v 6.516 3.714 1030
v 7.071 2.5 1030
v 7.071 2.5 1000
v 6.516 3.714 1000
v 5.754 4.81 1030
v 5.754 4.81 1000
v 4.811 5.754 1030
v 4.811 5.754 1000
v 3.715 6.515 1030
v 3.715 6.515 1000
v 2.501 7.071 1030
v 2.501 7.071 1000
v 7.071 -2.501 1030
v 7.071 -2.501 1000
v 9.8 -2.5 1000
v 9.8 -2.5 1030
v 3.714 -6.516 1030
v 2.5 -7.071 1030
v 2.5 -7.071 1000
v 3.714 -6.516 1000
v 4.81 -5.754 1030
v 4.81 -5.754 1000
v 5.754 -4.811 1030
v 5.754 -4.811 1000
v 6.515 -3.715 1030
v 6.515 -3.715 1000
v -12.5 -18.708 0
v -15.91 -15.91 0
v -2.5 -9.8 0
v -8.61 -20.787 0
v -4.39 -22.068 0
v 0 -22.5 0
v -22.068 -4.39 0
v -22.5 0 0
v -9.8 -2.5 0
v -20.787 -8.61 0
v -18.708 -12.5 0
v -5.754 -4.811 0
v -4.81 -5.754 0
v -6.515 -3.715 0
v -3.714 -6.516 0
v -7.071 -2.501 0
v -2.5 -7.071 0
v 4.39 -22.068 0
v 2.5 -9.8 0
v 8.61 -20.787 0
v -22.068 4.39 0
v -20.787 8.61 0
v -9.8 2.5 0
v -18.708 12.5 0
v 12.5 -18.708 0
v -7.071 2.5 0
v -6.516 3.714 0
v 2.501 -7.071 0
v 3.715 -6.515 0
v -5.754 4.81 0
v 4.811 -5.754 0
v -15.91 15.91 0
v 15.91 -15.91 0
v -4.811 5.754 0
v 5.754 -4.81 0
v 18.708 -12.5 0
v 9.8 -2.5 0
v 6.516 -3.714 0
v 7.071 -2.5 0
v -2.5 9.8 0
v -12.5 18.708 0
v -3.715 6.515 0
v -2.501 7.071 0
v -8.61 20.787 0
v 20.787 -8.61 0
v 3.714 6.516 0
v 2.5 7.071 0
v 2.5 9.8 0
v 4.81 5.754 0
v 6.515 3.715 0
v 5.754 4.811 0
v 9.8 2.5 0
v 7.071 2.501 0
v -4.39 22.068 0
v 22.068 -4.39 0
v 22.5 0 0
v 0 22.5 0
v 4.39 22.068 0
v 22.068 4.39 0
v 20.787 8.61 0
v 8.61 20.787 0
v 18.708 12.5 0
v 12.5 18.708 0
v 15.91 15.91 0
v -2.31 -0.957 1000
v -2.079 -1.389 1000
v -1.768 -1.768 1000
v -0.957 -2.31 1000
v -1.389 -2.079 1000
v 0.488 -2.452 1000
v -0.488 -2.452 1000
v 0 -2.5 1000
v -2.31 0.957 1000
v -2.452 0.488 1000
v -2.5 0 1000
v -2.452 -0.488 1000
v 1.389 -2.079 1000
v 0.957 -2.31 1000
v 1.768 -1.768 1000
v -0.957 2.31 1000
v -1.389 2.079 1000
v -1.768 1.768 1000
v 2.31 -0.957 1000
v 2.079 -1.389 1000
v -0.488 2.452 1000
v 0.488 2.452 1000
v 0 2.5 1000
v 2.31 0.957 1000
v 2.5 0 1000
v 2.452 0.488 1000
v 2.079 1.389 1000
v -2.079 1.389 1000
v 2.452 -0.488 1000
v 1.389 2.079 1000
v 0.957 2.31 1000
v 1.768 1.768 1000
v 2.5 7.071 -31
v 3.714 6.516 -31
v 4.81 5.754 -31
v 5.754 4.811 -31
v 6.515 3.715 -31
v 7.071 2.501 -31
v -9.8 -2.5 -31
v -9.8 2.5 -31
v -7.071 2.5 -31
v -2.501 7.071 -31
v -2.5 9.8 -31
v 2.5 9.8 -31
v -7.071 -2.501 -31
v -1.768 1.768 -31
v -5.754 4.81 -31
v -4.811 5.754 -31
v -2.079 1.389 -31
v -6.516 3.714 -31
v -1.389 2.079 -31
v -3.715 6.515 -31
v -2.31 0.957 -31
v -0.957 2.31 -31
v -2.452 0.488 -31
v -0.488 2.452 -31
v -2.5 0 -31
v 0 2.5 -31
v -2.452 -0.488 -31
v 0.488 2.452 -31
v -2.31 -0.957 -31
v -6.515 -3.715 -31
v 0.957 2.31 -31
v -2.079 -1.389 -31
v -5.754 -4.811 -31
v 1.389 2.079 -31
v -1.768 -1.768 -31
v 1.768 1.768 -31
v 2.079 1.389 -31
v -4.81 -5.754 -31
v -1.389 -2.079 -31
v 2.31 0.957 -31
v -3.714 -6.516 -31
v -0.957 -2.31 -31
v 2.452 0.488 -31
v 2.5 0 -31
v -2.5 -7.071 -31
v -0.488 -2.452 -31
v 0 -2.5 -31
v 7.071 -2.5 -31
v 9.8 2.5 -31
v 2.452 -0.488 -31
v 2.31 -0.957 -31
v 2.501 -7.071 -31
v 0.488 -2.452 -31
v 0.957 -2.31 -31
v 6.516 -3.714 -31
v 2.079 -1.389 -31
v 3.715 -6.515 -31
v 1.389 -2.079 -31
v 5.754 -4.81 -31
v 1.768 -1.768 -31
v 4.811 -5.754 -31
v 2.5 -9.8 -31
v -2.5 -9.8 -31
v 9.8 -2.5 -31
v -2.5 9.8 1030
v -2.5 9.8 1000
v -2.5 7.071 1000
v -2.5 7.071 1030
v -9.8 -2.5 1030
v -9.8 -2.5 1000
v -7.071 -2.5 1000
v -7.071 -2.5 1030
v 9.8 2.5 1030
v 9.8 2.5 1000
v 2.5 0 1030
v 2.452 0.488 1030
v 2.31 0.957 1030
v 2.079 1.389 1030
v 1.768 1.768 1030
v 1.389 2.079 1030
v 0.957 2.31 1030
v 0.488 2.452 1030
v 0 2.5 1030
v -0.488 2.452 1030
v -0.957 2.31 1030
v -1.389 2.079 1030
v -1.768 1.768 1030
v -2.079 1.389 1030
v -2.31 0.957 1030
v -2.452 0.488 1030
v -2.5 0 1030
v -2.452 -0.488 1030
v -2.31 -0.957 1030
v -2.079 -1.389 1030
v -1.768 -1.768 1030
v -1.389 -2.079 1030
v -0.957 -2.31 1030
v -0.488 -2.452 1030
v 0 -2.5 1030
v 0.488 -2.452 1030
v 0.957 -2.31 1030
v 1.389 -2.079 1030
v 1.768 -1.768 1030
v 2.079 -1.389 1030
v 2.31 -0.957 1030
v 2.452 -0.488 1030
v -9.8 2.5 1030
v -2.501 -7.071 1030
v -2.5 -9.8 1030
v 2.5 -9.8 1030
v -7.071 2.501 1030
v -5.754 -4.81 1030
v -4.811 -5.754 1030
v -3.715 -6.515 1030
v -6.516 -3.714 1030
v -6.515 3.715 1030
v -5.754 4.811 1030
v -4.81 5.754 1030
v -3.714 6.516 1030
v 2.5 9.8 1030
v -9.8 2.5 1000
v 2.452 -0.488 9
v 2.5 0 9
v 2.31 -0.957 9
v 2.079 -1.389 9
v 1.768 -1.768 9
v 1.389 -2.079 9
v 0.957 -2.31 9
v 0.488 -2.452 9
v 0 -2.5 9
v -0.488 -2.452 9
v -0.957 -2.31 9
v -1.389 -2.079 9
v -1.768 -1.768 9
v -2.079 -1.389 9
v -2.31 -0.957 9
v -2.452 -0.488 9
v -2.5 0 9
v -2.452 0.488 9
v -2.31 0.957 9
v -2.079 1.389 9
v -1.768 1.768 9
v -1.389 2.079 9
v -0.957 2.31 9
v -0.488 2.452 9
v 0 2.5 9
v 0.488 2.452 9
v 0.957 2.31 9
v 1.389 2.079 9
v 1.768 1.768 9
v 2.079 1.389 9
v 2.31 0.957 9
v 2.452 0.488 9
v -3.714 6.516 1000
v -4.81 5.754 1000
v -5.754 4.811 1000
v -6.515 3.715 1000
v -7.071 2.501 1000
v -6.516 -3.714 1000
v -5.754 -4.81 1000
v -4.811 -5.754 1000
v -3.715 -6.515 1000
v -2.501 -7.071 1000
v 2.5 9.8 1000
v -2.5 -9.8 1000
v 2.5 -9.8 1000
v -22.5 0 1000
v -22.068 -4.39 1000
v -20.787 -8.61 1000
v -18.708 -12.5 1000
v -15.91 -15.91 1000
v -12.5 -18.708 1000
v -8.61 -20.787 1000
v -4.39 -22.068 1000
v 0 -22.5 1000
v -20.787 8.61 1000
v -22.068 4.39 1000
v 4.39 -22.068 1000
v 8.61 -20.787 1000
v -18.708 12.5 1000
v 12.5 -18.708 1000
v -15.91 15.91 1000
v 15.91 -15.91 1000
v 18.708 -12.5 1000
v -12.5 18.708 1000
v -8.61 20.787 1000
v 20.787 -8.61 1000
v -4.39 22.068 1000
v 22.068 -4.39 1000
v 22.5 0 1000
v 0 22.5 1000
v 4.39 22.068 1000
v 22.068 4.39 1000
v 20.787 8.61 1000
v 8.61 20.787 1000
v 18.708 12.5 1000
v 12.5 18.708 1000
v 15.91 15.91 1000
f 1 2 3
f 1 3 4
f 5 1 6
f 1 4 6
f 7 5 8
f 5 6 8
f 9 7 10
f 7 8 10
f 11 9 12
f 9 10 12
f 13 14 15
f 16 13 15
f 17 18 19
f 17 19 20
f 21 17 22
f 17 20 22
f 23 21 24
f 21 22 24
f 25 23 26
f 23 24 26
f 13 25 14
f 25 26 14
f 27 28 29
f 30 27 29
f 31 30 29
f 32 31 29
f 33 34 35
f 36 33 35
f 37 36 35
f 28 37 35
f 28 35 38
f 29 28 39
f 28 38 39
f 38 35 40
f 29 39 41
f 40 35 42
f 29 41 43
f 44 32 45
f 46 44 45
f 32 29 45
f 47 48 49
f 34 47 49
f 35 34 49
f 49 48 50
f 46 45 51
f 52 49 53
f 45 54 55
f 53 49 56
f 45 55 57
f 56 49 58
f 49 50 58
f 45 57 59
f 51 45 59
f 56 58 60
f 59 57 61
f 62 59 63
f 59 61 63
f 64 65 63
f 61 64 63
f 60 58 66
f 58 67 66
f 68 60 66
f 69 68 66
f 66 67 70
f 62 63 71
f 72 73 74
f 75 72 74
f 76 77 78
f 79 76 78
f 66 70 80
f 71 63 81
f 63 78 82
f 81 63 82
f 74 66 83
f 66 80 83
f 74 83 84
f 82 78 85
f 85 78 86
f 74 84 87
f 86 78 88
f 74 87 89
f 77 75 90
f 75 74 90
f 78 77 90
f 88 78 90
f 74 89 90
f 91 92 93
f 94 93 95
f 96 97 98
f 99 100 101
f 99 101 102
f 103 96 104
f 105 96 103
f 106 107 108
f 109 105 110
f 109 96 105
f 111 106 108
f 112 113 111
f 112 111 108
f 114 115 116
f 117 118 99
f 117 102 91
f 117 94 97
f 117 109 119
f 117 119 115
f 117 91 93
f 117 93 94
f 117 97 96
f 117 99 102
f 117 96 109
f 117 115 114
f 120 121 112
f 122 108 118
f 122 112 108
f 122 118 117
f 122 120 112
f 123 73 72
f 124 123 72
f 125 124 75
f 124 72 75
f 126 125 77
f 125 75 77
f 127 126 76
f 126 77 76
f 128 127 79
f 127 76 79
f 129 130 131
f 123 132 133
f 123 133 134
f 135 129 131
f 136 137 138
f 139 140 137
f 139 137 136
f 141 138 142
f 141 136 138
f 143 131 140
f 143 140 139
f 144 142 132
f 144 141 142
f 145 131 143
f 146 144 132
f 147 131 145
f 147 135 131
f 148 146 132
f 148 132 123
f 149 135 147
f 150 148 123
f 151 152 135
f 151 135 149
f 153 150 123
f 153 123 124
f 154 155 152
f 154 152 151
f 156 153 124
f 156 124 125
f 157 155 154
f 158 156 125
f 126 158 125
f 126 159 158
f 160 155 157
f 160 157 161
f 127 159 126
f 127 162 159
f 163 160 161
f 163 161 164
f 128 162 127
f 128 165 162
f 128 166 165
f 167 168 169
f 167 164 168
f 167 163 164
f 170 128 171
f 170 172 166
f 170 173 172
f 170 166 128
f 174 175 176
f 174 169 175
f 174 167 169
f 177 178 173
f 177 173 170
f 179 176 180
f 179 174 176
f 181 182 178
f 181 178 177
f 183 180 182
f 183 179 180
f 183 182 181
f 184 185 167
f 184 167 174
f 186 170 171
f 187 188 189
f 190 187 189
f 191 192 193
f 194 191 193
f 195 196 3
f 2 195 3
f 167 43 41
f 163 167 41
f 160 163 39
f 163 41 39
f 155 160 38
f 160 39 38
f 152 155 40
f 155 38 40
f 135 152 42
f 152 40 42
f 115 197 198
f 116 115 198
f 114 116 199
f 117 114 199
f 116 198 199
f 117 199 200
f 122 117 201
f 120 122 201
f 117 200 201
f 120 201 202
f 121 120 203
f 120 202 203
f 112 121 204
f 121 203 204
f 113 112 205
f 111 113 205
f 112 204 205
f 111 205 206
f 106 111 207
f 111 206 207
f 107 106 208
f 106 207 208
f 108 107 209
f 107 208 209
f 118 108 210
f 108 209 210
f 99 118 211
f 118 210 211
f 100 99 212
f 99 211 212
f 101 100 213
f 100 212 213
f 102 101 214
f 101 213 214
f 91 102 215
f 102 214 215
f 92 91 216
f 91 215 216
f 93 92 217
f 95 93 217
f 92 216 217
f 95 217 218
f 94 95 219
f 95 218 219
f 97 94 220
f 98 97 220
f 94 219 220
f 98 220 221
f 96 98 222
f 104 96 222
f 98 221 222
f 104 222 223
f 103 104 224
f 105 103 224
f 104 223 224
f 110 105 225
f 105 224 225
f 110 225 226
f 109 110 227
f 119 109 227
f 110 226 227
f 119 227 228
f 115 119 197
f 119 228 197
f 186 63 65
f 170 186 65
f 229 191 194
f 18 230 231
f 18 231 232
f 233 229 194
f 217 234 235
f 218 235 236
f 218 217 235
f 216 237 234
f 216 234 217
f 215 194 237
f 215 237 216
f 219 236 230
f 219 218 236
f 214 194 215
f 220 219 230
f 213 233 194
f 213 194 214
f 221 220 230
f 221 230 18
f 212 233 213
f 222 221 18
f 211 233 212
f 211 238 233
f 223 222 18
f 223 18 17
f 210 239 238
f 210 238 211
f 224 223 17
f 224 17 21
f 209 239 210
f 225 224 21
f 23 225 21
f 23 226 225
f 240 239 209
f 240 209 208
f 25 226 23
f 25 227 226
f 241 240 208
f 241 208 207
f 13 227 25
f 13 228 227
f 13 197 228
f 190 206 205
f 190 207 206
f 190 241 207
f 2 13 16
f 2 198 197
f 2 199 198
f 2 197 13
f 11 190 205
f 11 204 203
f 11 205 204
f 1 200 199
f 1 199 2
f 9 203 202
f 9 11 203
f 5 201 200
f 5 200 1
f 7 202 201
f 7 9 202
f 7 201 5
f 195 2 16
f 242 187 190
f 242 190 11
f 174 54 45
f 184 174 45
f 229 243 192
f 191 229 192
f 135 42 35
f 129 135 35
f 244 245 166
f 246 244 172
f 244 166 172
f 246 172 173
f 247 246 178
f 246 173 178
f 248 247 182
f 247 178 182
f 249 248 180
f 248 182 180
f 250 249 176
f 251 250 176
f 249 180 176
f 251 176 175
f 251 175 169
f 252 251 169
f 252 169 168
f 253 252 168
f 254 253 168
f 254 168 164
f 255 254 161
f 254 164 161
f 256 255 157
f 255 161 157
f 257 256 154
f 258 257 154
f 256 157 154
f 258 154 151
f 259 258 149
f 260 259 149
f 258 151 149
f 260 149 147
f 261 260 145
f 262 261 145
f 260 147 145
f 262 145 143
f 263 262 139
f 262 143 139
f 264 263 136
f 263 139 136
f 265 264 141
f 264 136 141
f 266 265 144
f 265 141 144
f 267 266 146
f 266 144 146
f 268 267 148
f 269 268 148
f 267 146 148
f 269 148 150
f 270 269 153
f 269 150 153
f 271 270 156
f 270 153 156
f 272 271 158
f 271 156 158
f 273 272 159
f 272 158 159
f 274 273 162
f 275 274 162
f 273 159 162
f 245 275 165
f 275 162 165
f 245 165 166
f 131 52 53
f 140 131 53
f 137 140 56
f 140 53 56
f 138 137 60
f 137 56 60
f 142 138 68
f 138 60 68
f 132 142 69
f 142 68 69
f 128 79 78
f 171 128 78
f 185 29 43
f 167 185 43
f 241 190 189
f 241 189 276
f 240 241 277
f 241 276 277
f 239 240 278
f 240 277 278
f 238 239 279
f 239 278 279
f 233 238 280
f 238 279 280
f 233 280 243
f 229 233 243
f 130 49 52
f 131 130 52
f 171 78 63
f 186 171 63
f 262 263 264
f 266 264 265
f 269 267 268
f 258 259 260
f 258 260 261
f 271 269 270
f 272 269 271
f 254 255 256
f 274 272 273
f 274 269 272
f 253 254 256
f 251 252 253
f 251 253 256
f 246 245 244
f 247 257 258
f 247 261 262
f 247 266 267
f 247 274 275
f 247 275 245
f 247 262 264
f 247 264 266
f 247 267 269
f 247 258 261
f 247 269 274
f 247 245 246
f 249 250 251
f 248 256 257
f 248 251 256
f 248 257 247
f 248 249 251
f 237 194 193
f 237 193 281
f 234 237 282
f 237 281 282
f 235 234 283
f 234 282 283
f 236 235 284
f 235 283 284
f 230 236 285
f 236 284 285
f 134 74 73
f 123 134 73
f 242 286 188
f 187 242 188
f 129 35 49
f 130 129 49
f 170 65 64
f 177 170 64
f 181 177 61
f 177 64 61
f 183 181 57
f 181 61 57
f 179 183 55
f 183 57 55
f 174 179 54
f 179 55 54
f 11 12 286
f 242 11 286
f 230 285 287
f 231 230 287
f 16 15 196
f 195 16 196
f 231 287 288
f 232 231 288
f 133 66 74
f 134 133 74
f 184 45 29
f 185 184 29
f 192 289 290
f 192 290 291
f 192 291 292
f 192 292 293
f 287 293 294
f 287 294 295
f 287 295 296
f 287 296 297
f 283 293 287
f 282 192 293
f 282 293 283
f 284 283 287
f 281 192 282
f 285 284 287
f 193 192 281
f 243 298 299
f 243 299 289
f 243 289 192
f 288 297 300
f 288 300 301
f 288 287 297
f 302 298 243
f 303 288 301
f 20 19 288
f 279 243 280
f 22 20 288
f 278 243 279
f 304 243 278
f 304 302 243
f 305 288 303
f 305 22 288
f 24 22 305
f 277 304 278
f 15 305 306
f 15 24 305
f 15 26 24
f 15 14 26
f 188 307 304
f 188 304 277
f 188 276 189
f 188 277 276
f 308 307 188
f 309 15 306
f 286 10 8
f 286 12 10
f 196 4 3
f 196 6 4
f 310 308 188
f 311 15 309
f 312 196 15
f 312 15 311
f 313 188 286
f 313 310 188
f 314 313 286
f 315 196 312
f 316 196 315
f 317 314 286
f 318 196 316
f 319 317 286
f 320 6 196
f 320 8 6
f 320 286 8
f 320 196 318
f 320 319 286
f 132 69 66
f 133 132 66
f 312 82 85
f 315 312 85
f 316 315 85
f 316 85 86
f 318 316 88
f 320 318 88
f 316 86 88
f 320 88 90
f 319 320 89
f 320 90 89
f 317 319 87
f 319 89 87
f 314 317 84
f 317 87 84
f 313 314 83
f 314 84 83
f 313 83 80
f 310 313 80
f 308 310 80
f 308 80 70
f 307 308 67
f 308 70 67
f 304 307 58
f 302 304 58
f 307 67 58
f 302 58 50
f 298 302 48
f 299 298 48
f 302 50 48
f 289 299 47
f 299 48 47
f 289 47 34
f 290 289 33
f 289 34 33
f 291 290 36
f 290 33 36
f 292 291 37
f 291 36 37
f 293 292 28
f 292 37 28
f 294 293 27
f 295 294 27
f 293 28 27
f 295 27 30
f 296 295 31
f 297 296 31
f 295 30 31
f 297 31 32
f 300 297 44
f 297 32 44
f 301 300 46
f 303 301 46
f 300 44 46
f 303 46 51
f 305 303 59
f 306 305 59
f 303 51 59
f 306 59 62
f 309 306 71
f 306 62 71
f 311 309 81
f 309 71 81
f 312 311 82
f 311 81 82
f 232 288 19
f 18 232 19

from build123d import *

# Parameters (mm, degrees)
F0_R     = 22.5
F1_DEPTH = 1000
F4_DEPTH = 31
F5_R     = 2.5
F6_DEPTH = 40
F7_DEPTH = 30
F8_R     = 2.5
F9_DEPTH = 30


with BuildPart() as f1:
    # F0 (on Top) → F1 (new body)
    with BuildSketch(Plane.XY):
        Circle(F0_R)
    extrude(amount=F1_DEPTH)

    # F3 (on face) → F4 (join)
    with BuildSketch(Plane(origin=(0, 0, 0), x_dir=(1, 0, 0), z_dir=(0, 0, -1))):
        with BuildLine():
            ThreePointArc((7.0710678119, 2.5), (7.3919891974, 1.2682648404), (7.5, 0))
            ThreePointArc((7.5, 0), (7.3919069765, -1.268743966), (7.0707436663, -2.500916633))
            Line((7.0707436663, -2.500916633), (9.7997435124, -2.5))
            Line((9.7997435124, -2.5), (9.7997435124, 0))
            Line((9.7997435124, 0), (9.7997435124, 2.5))
            Line((9.7997435124, 2.5), (7.0710678119, 2.5))
        make_face()
        with BuildLine():
            Line((2.5, -9.7997435124), (2.5, -7.0710678119))
            ThreePointArc((2.5, -7.0710678119), (-0.0004861292, -7.4999999842), (-2.500916633, -7.0707436663))
            Line((-2.500916633, -7.0707436663), (-2.5, -9.7997435124))
            Line((-2.5, -9.7997435124), (0, -9.7997435124))
            Line((0, -9.7997435124), (2.5, -9.7997435124))
        make_face()
        with BuildLine():
            ThreePointArc((-7.0710678119, -2.5), (-7.4999999842, 0.0004861292), (-7.0707436663, 2.500916633))
            Line((-7.0707436663, 2.500916633), (-9.7997435124, 2.5))
            Line((-9.7997435124, 2.5), (-9.7997435124, 0))
            Line((-9.7997435124, 0), (-9.7997435124, -2.5))
            Line((-9.7997435124, -2.5), (-7.0710678119, -2.5))
        make_face()
        with BuildLine():
            ThreePointArc((7.0707436663, -2.500916633), (7.3919069765, -1.268743966), (7.5, 0))
            ThreePointArc((7.5, 0), (7.3919891974, 1.2682648404), (7.0710678119, 2.5))
            ThreePointArc((7.0710678119, 2.5), (5.303644593, 5.3029571025), (2.500916633, 7.0707436663))
            ThreePointArc((2.500916633, 7.0707436663), (0.0004861292, 7.4999999842), (-2.5, 7.0710678119))
            ThreePointArc((-2.5, 7.0710678119), (-5.3029571025, 5.303644593), (-7.0707436663, 2.500916633))
            ThreePointArc((-7.0707436663, 2.500916633), (-7.4999999842, 0.0004861292), (-7.0710678119, -2.5))
            ThreePointArc((-7.0710678119, -2.5), (-5.303644593, -5.3029571025), (-2.500916633, -7.0707436663))
            ThreePointArc((-2.500916633, -7.0707436663), (-0.0004861292, -7.4999999842), (2.5, -7.0710678119))
            ThreePointArc((2.5, -7.0710678119), (5.3029571025, -5.303644593), (7.0707436663, -2.500916633))
        make_face()
        with BuildLine():
            ThreePointArc((-2.5, 7.0710678119), (0.0004861292, 7.4999999842), (2.500916633, 7.0707436663))
            Line((2.500916633, 7.0707436663), (2.5, 9.7997435124))
            Line((2.5, 9.7997435124), (0, 9.7997435124))
            Line((0, 9.7997435124), (-2.5, 9.7997435124))
            Line((-2.5, 9.7997435124), (-2.5, 7.0710678119))
        make_face()
    extrude(amount=F4_DEPTH)

    # F5 (on face) → F6 (cut)
    with BuildSketch(Plane(origin=(0, 0, -31), x_dir=(1, 0, 0), z_dir=(0, 0, -1))):
        Circle(F5_R)
    extrude(amount=-F6_DEPTH, mode=Mode.SUBTRACT)

    # F2 (on face) → F7 (join)
    with BuildSketch(Plane.XY.offset(1000)):
        with BuildLine():
            ThreePointArc((7.0707436663, -2.500916633), (7.3919069765, -1.268743966), (7.5, 0))
            ThreePointArc((7.5, 0), (7.3919891974, 1.2682648404), (7.0710678119, 2.5))
            ThreePointArc((7.0710678119, 2.5), (5.303644593, 5.3029571025), (2.500916633, 7.0707436663))
            ThreePointArc((2.500916633, 7.0707436663), (0.0004861292, 7.4999999842), (-2.5, 7.0710678119))
            ThreePointArc((-2.5, 7.0710678119), (-5.3029571025, 5.303644593), (-7.0707436663, 2.500916633))
            ThreePointArc((-7.0707436663, 2.500916633), (-7.4999999842, 0.0004861292), (-7.0710678119, -2.5))
            ThreePointArc((-7.0710678119, -2.5), (-5.303644593, -5.3029571025), (-2.500916633, -7.0707436663))
            ThreePointArc((-2.500916633, -7.0707436663), (-0.0004861292, -7.4999999842), (2.5, -7.0710678119))
            ThreePointArc((2.5, -7.0710678119), (5.3029571025, -5.303644593), (7.0707436663, -2.500916633))
        make_face()
        with BuildLine():
            ThreePointArc((-7.0710678119, -2.5), (-7.4999999842, 0.0004861292), (-7.0707436663, 2.500916633))
            Line((-7.0707436663, 2.500916633), (-9.7997435124, 2.5))
            Line((-9.7997435124, 2.5), (-9.7997435124, 0))
            Line((-9.7997435124, 0), (-9.7997435124, -2.5))
            Line((-9.7997435124, -2.5), (-7.0710678119, -2.5))
        make_face()
        with BuildLine():
            ThreePointArc((-2.5, 7.0710678119), (0.0004861292, 7.4999999842), (2.500916633, 7.0707436663))
            Line((2.500916633, 7.0707436663), (2.5, 9.7997435124))
            Line((2.5, 9.7997435124), (0, 9.7997435124))
            Line((0, 9.7997435124), (-2.5, 9.7997435124))
            Line((-2.5, 9.7997435124), (-2.5, 7.0710678119))
        make_face()
        with BuildLine():
            ThreePointArc((7.0710678119, 2.5), (7.3919891974, 1.2682648404), (7.5, 0))
            ThreePointArc((7.5, 0), (7.3919069765, -1.268743966), (7.0707436663, -2.500916633))
            Line((7.0707436663, -2.500916633), (9.7997435124, -2.5))
            Line((9.7997435124, -2.5), (9.7997435124, 0))
            Line((9.7997435124, 0), (9.7997435124, 2.5))
            Line((9.7997435124, 2.5), (7.0710678119, 2.5))
        make_face()
        with BuildLine():
            Line((2.5, -9.7997435124), (2.5, -7.0710678119))
            ThreePointArc((2.5, -7.0710678119), (-0.0004861292, -7.4999999842), (-2.500916633, -7.0707436663))
            Line((-2.500916633, -7.0707436663), (-2.5, -9.7997435124))
            Line((-2.5, -9.7997435124), (0, -9.7997435124))
            Line((0, -9.7997435124), (2.5, -9.7997435124))
        make_face()
    extrude(amount=F7_DEPTH)

    # F8 (on face) → F9 (cut)
    with BuildSketch(Plane.XY.offset(1030)):
        Circle(F8_R)
    extrude(amount=-F9_DEPTH, mode=Mode.SUBTRACT)


solid = f1.part
